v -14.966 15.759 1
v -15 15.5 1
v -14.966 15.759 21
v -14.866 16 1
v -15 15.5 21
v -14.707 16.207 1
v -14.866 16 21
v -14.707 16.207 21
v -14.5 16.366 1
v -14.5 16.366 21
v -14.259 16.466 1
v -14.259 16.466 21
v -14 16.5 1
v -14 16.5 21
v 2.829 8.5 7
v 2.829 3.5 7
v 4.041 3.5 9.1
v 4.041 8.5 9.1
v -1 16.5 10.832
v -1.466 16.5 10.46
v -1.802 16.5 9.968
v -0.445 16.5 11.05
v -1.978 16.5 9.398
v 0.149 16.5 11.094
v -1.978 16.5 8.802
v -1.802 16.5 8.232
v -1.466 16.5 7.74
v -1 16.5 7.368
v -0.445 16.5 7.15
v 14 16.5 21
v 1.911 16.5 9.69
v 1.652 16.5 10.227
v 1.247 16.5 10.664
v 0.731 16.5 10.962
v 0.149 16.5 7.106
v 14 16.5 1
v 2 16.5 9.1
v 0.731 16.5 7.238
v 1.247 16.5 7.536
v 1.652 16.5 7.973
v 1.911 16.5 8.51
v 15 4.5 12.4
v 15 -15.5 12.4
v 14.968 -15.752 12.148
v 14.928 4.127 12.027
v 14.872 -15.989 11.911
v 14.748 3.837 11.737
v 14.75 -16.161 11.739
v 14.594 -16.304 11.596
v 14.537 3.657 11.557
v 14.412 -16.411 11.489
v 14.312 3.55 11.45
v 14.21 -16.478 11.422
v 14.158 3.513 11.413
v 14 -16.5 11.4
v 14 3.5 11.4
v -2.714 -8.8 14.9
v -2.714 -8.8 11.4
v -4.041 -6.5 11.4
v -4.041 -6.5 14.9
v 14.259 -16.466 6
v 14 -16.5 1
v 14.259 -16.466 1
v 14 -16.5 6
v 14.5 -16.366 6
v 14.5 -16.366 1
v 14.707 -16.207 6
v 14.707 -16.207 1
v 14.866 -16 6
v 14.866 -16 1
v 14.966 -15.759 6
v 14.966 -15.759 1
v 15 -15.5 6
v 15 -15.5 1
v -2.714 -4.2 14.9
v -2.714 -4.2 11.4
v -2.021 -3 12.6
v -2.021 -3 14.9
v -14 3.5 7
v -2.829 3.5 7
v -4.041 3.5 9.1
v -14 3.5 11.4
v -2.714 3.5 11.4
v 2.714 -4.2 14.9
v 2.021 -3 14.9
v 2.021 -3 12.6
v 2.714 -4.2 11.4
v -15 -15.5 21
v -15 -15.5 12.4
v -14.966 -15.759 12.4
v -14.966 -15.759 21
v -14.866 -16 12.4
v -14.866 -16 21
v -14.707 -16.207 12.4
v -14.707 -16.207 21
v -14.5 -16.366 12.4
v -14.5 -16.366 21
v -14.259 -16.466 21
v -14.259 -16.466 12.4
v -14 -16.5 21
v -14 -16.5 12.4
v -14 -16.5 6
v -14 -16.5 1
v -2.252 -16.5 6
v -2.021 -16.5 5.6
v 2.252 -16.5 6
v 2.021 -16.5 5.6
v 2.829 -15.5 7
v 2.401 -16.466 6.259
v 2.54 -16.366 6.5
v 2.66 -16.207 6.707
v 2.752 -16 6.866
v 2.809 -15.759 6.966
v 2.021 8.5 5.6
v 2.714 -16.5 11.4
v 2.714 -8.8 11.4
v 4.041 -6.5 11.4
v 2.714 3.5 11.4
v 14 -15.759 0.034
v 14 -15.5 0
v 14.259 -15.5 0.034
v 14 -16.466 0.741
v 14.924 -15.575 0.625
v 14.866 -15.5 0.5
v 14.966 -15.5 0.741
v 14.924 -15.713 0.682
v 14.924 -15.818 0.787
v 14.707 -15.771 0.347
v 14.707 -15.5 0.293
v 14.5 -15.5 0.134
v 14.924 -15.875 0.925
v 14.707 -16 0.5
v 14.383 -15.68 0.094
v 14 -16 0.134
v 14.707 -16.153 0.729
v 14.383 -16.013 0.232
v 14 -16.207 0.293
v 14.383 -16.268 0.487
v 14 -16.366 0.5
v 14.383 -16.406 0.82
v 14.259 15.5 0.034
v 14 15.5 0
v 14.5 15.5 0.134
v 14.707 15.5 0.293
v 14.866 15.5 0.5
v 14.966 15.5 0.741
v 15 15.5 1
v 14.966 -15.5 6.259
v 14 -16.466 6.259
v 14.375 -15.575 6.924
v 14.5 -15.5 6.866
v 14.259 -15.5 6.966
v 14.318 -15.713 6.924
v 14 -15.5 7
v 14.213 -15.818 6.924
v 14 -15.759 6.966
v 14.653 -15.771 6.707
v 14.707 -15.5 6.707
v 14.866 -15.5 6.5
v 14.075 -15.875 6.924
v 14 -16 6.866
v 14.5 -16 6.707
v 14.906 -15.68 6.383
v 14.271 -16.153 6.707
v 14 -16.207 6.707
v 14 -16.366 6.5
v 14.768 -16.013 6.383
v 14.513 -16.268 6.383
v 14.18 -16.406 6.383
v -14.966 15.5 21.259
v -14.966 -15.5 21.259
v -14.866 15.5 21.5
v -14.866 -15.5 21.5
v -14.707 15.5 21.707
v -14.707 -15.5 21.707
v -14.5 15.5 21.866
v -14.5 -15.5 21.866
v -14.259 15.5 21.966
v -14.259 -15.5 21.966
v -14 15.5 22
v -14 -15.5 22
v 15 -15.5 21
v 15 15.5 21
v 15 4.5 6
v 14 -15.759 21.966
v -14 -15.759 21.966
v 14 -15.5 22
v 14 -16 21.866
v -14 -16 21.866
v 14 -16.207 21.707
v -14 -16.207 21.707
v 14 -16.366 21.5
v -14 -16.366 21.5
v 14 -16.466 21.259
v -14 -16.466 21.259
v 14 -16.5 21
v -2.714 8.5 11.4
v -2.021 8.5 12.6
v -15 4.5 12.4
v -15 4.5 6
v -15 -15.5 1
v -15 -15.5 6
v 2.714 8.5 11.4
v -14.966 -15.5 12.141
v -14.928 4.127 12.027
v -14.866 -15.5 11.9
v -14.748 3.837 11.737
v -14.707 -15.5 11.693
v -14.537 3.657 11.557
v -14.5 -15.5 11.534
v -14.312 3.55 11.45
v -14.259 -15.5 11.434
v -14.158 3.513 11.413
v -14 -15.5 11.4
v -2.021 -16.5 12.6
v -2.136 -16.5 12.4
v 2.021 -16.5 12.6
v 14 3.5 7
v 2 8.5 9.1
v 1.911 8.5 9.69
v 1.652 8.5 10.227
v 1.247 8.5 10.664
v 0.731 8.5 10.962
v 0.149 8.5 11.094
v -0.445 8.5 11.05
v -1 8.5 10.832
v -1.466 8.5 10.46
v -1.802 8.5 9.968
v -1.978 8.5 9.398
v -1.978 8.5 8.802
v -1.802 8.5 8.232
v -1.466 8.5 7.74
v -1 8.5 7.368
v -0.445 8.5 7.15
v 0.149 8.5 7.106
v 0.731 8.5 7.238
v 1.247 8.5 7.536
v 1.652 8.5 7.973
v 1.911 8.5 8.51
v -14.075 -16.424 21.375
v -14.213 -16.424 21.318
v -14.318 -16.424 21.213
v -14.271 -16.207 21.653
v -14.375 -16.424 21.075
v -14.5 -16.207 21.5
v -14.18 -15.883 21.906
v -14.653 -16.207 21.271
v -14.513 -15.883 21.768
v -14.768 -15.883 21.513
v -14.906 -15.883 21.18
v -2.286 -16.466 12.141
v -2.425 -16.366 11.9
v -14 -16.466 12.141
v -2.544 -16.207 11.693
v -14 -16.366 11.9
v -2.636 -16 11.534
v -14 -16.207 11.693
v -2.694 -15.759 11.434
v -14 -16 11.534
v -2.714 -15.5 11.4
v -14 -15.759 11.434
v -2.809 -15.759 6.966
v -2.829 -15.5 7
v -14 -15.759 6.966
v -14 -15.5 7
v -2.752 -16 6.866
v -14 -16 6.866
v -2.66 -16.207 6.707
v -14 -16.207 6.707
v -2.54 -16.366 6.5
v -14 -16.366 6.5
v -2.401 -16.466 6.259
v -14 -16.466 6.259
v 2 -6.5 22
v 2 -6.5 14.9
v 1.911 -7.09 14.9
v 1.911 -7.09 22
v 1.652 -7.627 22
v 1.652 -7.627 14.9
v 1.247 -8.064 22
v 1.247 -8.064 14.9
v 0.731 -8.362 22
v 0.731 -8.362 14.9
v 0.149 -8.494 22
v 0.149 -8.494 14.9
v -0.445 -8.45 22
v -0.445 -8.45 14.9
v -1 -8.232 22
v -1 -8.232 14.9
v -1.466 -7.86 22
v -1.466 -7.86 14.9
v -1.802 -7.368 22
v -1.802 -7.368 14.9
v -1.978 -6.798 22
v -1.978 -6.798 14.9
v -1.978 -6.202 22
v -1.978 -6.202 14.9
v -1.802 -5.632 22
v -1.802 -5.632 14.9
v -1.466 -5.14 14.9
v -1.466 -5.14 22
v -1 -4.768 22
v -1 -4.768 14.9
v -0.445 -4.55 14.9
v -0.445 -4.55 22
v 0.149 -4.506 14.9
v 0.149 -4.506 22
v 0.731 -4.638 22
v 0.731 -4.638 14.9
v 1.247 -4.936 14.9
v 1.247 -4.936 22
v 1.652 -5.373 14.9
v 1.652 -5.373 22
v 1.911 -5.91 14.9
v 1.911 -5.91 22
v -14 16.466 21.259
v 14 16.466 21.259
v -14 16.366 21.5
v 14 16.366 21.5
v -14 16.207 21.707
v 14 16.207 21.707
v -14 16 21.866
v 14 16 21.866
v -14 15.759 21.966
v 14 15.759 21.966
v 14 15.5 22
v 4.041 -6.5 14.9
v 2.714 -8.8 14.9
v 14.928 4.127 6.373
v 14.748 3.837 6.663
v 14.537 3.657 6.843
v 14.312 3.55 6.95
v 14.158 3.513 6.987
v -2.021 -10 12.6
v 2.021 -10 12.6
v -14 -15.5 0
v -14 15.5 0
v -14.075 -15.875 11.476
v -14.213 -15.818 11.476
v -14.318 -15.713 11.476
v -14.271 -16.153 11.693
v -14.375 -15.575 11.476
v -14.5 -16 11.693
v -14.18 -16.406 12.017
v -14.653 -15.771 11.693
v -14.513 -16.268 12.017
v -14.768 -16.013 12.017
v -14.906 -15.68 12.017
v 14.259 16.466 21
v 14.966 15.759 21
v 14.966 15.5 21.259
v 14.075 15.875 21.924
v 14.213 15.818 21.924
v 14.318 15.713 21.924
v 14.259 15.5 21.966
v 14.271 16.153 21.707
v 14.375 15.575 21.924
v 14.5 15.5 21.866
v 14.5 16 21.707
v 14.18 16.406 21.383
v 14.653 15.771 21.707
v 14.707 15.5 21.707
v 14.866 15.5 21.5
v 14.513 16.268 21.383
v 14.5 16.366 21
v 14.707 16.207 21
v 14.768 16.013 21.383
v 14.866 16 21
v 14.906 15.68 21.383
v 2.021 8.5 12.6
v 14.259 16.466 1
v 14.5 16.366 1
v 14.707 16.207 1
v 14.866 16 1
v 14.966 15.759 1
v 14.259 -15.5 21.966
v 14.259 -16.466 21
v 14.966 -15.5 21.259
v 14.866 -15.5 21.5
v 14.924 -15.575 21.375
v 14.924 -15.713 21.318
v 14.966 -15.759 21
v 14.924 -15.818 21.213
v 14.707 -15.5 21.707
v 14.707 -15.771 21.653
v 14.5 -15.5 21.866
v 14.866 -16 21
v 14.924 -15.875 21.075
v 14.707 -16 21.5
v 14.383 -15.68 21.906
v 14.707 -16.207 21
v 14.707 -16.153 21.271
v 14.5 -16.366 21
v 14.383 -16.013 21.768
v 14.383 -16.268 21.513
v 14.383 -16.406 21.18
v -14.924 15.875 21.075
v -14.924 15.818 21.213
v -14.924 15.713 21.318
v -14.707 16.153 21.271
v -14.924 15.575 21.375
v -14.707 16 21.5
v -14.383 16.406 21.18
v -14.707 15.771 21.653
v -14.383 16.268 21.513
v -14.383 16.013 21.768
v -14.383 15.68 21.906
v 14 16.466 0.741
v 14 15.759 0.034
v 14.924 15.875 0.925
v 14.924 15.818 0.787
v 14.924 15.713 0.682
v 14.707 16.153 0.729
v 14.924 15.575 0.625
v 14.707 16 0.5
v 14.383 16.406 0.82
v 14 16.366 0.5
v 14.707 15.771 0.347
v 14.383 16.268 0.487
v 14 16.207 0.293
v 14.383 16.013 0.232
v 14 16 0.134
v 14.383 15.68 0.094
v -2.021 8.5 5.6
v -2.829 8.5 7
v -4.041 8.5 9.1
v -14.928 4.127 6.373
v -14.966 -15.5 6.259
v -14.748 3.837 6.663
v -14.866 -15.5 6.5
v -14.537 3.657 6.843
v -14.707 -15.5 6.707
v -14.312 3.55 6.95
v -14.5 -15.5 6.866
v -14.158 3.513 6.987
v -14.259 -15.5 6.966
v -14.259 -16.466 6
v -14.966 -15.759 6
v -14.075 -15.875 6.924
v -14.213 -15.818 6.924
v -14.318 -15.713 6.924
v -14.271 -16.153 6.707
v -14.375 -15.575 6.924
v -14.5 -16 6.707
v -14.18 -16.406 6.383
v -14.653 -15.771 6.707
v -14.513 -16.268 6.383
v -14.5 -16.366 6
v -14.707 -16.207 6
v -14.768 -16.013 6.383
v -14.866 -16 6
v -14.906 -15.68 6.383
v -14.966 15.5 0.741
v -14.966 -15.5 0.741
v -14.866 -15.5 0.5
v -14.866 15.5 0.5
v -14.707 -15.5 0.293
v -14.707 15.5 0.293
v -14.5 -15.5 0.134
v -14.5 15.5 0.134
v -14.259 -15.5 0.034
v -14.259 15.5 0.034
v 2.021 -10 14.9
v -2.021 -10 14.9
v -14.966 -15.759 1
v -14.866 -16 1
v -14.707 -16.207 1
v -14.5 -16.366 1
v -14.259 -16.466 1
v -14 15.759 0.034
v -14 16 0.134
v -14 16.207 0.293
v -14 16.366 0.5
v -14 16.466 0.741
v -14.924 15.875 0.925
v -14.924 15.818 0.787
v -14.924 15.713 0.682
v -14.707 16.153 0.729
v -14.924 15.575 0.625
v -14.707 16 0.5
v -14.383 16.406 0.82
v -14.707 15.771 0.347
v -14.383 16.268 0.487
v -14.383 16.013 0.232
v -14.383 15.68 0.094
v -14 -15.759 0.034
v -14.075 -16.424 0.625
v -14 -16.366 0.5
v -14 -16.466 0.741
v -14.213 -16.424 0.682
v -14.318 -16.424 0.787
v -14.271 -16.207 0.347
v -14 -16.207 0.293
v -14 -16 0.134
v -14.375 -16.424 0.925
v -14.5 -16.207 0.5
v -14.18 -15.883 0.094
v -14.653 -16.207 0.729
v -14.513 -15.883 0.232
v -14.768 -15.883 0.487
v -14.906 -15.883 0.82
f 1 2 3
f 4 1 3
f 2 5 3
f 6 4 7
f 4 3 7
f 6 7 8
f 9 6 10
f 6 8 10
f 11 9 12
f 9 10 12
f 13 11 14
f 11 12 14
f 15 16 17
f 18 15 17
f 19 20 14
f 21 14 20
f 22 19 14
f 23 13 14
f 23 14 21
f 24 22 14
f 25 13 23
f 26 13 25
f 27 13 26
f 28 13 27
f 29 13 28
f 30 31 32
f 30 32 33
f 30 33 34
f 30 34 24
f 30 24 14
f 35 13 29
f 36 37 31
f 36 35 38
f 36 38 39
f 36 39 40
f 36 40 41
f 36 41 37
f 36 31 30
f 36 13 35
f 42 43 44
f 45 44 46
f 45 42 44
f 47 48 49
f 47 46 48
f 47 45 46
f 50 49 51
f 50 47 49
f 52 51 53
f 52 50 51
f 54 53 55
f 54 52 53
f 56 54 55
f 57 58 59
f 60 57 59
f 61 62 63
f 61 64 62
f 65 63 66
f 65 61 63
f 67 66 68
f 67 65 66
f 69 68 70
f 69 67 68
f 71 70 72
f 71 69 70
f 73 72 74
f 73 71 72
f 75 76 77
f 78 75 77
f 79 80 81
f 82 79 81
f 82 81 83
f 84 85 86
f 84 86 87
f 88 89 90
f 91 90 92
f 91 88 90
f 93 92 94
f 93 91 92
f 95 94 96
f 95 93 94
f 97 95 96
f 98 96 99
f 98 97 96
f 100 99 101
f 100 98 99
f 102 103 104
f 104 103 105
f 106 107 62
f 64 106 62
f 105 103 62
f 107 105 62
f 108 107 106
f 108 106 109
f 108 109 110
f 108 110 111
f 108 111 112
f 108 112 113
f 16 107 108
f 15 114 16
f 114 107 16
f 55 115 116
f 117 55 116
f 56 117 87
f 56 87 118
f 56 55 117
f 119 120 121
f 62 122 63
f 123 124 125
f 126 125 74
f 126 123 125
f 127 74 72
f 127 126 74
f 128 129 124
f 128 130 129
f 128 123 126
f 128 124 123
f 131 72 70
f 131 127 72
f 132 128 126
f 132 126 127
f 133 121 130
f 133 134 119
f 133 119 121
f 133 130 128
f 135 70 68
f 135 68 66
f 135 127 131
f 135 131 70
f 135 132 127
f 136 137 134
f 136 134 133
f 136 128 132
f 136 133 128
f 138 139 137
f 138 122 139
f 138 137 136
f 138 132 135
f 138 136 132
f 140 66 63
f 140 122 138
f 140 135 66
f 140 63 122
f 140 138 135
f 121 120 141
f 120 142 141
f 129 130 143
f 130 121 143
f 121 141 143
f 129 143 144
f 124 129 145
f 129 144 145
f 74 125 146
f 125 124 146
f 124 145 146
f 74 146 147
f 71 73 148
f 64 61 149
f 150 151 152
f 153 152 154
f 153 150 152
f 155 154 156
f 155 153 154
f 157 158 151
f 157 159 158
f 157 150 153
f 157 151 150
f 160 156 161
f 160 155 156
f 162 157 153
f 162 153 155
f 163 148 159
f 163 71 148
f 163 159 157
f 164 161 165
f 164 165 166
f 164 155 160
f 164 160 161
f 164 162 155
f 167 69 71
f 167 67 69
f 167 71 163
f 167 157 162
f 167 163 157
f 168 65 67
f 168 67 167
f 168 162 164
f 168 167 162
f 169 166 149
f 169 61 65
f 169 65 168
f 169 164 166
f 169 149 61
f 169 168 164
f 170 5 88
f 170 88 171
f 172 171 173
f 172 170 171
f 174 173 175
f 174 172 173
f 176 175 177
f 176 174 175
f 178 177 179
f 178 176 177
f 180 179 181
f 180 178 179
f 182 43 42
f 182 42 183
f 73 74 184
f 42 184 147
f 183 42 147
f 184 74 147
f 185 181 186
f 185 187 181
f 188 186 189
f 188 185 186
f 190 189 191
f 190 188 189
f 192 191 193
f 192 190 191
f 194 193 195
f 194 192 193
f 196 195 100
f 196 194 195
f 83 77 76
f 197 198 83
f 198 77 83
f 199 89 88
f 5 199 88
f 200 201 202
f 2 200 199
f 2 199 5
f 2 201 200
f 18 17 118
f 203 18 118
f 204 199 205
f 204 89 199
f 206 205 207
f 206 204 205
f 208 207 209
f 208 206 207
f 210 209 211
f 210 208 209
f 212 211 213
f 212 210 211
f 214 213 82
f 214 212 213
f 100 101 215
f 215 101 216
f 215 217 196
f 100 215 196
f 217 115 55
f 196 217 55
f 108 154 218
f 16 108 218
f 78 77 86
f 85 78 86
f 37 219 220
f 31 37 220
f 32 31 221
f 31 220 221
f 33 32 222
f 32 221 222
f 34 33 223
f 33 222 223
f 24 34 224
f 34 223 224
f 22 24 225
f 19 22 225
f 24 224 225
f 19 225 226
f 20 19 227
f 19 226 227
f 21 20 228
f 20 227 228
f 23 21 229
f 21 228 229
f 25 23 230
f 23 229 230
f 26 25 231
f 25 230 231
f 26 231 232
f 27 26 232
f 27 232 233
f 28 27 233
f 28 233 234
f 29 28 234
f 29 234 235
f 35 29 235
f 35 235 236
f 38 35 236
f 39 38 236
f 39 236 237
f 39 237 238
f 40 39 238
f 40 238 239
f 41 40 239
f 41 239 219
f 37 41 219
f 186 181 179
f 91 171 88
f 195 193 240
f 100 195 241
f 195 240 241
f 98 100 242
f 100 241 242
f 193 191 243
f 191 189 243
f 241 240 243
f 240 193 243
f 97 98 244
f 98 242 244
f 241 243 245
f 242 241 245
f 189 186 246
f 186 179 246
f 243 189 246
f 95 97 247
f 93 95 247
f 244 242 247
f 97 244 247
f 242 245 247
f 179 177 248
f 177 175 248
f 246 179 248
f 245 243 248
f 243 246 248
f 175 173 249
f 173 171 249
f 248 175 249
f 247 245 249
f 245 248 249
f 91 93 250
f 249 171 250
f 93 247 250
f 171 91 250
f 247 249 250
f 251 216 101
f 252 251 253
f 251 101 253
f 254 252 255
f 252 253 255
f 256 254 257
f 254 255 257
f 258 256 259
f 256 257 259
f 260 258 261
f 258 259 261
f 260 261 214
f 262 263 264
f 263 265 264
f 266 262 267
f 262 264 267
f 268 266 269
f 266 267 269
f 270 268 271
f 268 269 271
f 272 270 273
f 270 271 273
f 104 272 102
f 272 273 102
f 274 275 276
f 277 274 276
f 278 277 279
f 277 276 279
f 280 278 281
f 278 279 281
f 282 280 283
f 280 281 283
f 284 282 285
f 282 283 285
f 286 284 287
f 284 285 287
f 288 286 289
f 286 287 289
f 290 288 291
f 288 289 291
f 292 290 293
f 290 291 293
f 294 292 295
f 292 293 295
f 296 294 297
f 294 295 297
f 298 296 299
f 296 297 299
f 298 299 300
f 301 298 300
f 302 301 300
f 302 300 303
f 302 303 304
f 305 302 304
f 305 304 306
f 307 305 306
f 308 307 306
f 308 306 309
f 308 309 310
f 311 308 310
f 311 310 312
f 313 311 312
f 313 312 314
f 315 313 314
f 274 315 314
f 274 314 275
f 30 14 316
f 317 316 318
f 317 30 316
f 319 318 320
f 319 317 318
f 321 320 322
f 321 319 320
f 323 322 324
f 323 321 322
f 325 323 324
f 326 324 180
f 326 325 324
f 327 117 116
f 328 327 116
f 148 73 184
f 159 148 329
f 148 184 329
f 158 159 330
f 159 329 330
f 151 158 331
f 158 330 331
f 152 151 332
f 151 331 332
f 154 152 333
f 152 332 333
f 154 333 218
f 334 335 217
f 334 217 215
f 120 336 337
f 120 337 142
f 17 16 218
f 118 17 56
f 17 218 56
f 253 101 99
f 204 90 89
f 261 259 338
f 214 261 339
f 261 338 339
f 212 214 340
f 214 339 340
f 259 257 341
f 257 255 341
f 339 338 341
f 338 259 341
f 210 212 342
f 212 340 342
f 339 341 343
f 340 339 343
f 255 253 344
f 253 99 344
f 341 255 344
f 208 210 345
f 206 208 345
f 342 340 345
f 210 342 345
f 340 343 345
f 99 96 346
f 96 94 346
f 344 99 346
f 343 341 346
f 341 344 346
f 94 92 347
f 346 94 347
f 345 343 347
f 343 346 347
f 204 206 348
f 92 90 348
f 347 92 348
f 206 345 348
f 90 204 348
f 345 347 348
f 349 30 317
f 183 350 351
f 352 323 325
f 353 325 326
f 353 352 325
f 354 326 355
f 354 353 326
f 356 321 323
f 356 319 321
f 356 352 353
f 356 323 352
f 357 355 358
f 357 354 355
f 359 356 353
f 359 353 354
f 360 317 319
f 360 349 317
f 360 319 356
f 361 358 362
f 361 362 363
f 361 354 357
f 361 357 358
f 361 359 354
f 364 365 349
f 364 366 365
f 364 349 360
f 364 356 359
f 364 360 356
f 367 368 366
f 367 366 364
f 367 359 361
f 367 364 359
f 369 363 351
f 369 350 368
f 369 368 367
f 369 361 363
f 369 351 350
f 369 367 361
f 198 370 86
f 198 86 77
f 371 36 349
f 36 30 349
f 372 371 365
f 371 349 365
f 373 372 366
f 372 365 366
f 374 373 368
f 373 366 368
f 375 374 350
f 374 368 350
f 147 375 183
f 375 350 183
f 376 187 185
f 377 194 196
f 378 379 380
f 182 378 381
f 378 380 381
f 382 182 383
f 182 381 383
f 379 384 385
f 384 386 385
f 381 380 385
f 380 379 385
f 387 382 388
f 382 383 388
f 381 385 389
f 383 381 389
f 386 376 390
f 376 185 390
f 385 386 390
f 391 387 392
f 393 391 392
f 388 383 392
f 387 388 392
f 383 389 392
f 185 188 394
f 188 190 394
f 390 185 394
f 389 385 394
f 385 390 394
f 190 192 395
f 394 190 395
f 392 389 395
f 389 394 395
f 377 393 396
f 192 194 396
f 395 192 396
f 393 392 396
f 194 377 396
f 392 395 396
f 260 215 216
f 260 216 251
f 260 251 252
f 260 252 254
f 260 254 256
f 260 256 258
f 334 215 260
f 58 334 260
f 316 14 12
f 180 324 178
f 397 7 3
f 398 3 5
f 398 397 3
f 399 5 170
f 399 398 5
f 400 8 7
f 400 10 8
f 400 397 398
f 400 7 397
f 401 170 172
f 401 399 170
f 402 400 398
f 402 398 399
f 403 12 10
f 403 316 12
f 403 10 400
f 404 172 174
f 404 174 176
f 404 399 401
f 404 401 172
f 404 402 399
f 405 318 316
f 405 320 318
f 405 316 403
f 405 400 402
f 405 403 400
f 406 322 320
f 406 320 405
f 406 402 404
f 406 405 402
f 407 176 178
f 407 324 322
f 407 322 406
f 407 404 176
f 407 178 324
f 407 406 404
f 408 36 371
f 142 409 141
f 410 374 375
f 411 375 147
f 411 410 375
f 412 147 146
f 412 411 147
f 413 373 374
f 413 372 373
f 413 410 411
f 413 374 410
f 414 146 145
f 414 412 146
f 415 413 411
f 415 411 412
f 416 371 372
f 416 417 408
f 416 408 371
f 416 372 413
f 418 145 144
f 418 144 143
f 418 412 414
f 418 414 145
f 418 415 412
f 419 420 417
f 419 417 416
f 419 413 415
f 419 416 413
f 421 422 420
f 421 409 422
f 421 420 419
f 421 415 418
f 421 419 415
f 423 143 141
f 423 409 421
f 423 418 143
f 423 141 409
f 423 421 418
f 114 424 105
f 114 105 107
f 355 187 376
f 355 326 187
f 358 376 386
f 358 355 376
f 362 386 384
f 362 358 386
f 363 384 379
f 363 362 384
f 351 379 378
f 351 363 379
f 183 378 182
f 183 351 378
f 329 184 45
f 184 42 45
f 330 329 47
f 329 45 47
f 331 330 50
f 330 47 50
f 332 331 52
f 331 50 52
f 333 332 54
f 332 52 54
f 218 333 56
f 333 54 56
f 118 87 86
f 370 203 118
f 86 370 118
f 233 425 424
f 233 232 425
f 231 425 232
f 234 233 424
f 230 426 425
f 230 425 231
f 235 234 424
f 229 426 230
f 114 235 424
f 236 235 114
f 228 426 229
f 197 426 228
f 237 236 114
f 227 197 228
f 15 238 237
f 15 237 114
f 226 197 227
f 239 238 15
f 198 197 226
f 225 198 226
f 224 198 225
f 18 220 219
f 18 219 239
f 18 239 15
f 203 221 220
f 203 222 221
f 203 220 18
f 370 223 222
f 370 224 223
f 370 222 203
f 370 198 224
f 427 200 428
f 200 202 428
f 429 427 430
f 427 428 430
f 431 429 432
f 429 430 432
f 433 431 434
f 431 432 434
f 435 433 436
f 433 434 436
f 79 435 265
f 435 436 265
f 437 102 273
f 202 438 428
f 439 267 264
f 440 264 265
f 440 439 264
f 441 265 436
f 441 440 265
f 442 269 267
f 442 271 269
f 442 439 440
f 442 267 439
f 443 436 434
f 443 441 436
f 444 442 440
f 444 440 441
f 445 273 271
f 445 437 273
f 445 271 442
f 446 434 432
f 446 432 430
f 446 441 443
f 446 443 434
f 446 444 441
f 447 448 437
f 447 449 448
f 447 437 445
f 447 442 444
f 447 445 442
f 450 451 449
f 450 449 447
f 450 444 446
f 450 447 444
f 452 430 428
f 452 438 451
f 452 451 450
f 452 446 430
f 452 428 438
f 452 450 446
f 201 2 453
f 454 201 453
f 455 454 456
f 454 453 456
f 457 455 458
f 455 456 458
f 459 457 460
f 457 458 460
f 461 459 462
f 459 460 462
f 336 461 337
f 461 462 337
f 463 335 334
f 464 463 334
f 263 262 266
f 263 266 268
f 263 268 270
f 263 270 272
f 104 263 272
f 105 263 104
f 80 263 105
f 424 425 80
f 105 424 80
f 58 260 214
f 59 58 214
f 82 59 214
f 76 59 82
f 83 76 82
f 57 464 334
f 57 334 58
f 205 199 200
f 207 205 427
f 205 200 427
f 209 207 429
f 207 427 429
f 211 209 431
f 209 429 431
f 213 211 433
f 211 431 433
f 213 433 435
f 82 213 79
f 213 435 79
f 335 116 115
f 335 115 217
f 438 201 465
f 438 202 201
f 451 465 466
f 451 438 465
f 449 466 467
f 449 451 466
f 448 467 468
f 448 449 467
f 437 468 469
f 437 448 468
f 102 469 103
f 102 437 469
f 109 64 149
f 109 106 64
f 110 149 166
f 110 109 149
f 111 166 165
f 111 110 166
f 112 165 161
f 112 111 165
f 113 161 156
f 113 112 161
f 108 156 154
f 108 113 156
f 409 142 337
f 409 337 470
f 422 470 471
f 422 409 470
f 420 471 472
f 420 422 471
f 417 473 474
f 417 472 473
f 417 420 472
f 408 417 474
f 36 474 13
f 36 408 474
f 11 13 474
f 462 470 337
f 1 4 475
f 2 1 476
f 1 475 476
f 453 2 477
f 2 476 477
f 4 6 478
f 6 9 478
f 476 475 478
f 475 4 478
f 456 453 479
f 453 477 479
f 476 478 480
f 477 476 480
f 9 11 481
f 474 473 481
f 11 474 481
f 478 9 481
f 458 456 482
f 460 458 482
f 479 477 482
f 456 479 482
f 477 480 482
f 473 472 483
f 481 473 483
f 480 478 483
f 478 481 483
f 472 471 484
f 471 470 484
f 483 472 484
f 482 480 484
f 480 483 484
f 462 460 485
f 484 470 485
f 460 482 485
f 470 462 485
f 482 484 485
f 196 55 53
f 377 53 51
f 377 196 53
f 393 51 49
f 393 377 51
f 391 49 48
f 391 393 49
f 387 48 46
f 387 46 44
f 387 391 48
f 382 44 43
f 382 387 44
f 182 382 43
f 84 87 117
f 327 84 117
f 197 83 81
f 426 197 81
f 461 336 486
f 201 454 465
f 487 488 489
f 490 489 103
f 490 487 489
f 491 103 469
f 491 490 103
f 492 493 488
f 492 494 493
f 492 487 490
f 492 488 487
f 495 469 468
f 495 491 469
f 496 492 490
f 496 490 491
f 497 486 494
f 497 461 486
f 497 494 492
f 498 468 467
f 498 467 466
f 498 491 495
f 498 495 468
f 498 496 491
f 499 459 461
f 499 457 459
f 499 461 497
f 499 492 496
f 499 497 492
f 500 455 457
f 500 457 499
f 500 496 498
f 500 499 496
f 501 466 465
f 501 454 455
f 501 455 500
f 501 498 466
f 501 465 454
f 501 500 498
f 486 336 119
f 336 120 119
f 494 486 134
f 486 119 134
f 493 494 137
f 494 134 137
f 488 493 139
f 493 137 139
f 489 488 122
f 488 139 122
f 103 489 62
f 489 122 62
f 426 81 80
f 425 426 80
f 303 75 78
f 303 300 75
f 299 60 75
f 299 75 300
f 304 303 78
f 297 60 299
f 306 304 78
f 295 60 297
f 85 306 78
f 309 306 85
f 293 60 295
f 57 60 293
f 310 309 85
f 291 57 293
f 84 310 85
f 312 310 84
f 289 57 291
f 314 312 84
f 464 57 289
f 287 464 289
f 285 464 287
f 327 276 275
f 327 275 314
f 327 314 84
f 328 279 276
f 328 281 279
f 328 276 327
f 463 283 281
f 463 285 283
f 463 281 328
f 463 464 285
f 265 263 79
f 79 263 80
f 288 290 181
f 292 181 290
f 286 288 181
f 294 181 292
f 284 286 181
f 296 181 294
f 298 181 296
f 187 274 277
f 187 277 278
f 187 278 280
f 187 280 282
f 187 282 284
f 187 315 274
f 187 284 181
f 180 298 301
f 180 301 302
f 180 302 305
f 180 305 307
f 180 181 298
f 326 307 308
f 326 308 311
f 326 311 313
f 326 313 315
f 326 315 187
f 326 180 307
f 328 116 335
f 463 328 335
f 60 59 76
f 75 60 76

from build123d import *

# Parameters (mm, degrees)
F0_W          = 30
F0_H          = 33
F1_DEPTH      = 22
F2_W          = 20
F2_H          = 4.4
F3_DEPTH      = 30.001
F4_R          = 2
F5_DEPTH      = 5
F5_DEPTH_BACK = 20.001
F6_DEPTH      = 13.001
F7_R          = 2
F8_DEPTH      = 10.601
F9_DEPTH      = 3.5
F10_R         = 1


with BuildPart() as f1:
    # F0 (on Top) → F1 (new body)
    with BuildSketch(Plane.XY):
        Rectangle(F0_W, F0_H)
    extrude(amount=F1_DEPTH)

    # F2 (on face) → F3 (cut, through all)
    with BuildSketch(Plane.YZ.offset(15)):
        with Locations((-6.5, 9.2)):
            Rectangle(F2_W, F2_H)
    extrude(amount=-F3_DEPTH, mode=Mode.SUBTRACT)

    # F4 (on face) → F5 (cut, two sides)
    with BuildSketch(Plane.XZ.offset(-3.5)) as f5_sk:
        Polygon((-2.7135462652, 11.4), (2.7135462652, 11.4), (2.0207259422, 12.6), (-2.0207259422, 12.6), align=None)
        Polygon((-2.829016319, 7), (2.829016319, 7), (4.0414518843, 9.1), (2.7135462652, 11.4), (-2.7135462652, 11.4), (-4.0414518843, 9.1), align=None)
        with Locations((0, 9.1)):
            Circle(F4_R, mode=Mode.SUBTRACT)
        Polygon((-2.0207259422, 5.6), (2.0207259422, 5.6), (2.829016319, 7), (-2.829016319, 7), align=None)
    extrude(amount=-F5_DEPTH, mode=Mode.SUBTRACT)
    extrude(f5_sk.sketch, amount=F5_DEPTH_BACK, mode=Mode.SUBTRACT)

    # F6 (cut, through all): a face of the model
    f6_faces = [f1.faces().sort_by_distance(p)[0] for p in [
        (0, 3.5, 9.1),
    ]]
    extrude(f6_faces, amount=-F6_DEPTH, mode=Mode.SUBTRACT)

    # F7 (on face) → F8 (cut, through all)
    with BuildSketch(Plane(origin=(0, 0, 11.4), x_dir=(1, 0, 0), z_dir=(0, 0, -1))):
        with Locations((0, 6.5)):
            Circle(F7_R)
    extrude(amount=-F8_DEPTH, mode=Mode.SUBTRACT)

    # F7 (on face) → F9 (cut)
    with BuildSketch(Plane(origin=(0, 0, 11.4), x_dir=(1, 0, 0), z_dir=(0, 0, -1))):
        Polygon((-4.0414518843, 6.5), (-2.7135462652, 4.2), (-2.7135462652, 8.8), align=None)
        Polygon((-2.7135462652, 8.8), (-2.7135462652, 4.2), (-2.0207259422, 3), (2.0207259422, 3), (2.7135462652, 4.2), (2.7135462652, 8.8), (2.0207259422, 10), (-2.0207259422, 10), align=None)
        with Locations((0, 6.5)):
            Circle(F7_R, mode=Mode.SUBTRACT)
        Polygon((2.7135462652, 8.8), (2.7135462652, 4.2), (4.0414518843, 6.5), align=None)
    extrude(amount=-F9_DEPTH, mode=Mode.SUBTRACT)

    # F10
    f10_edges = [f1.edges().sort_by_distance(p)[0] for p in [
        (0, 16.5, 0),
        (15, 16.5, 11),
        (0, 16.5, 22),
        (-15, 16.5, 11),
        (-15, 0, 0),
        (0, -16.5, 0),
        (15, 0, 0),
        (-15, 0, 22),
        (0, -16.5, 22),
        (15, 0, 22),
        (-15, -16.5, 3.5),
        (-15, -16.5, 16.7),
        (15, -16.5, 3.5),
        (15, -16.5, 16.7),
        (15, -6.5, 11.4),
        (15, -6.5, 7),
        (8.914508, -16.5, 7),
        (-8.914508, -16.5, 7),
        (-8.856773, -16.5, 11.4),
        (-15, 3.5, 9.2),
        (-15, -6.5, 7),
        (-15, -6.5, 11.4),
        (15, 3.5, 9.2),
    ]]
    fillet(f10_edges, radius=F10_R)


solid = f1.part
